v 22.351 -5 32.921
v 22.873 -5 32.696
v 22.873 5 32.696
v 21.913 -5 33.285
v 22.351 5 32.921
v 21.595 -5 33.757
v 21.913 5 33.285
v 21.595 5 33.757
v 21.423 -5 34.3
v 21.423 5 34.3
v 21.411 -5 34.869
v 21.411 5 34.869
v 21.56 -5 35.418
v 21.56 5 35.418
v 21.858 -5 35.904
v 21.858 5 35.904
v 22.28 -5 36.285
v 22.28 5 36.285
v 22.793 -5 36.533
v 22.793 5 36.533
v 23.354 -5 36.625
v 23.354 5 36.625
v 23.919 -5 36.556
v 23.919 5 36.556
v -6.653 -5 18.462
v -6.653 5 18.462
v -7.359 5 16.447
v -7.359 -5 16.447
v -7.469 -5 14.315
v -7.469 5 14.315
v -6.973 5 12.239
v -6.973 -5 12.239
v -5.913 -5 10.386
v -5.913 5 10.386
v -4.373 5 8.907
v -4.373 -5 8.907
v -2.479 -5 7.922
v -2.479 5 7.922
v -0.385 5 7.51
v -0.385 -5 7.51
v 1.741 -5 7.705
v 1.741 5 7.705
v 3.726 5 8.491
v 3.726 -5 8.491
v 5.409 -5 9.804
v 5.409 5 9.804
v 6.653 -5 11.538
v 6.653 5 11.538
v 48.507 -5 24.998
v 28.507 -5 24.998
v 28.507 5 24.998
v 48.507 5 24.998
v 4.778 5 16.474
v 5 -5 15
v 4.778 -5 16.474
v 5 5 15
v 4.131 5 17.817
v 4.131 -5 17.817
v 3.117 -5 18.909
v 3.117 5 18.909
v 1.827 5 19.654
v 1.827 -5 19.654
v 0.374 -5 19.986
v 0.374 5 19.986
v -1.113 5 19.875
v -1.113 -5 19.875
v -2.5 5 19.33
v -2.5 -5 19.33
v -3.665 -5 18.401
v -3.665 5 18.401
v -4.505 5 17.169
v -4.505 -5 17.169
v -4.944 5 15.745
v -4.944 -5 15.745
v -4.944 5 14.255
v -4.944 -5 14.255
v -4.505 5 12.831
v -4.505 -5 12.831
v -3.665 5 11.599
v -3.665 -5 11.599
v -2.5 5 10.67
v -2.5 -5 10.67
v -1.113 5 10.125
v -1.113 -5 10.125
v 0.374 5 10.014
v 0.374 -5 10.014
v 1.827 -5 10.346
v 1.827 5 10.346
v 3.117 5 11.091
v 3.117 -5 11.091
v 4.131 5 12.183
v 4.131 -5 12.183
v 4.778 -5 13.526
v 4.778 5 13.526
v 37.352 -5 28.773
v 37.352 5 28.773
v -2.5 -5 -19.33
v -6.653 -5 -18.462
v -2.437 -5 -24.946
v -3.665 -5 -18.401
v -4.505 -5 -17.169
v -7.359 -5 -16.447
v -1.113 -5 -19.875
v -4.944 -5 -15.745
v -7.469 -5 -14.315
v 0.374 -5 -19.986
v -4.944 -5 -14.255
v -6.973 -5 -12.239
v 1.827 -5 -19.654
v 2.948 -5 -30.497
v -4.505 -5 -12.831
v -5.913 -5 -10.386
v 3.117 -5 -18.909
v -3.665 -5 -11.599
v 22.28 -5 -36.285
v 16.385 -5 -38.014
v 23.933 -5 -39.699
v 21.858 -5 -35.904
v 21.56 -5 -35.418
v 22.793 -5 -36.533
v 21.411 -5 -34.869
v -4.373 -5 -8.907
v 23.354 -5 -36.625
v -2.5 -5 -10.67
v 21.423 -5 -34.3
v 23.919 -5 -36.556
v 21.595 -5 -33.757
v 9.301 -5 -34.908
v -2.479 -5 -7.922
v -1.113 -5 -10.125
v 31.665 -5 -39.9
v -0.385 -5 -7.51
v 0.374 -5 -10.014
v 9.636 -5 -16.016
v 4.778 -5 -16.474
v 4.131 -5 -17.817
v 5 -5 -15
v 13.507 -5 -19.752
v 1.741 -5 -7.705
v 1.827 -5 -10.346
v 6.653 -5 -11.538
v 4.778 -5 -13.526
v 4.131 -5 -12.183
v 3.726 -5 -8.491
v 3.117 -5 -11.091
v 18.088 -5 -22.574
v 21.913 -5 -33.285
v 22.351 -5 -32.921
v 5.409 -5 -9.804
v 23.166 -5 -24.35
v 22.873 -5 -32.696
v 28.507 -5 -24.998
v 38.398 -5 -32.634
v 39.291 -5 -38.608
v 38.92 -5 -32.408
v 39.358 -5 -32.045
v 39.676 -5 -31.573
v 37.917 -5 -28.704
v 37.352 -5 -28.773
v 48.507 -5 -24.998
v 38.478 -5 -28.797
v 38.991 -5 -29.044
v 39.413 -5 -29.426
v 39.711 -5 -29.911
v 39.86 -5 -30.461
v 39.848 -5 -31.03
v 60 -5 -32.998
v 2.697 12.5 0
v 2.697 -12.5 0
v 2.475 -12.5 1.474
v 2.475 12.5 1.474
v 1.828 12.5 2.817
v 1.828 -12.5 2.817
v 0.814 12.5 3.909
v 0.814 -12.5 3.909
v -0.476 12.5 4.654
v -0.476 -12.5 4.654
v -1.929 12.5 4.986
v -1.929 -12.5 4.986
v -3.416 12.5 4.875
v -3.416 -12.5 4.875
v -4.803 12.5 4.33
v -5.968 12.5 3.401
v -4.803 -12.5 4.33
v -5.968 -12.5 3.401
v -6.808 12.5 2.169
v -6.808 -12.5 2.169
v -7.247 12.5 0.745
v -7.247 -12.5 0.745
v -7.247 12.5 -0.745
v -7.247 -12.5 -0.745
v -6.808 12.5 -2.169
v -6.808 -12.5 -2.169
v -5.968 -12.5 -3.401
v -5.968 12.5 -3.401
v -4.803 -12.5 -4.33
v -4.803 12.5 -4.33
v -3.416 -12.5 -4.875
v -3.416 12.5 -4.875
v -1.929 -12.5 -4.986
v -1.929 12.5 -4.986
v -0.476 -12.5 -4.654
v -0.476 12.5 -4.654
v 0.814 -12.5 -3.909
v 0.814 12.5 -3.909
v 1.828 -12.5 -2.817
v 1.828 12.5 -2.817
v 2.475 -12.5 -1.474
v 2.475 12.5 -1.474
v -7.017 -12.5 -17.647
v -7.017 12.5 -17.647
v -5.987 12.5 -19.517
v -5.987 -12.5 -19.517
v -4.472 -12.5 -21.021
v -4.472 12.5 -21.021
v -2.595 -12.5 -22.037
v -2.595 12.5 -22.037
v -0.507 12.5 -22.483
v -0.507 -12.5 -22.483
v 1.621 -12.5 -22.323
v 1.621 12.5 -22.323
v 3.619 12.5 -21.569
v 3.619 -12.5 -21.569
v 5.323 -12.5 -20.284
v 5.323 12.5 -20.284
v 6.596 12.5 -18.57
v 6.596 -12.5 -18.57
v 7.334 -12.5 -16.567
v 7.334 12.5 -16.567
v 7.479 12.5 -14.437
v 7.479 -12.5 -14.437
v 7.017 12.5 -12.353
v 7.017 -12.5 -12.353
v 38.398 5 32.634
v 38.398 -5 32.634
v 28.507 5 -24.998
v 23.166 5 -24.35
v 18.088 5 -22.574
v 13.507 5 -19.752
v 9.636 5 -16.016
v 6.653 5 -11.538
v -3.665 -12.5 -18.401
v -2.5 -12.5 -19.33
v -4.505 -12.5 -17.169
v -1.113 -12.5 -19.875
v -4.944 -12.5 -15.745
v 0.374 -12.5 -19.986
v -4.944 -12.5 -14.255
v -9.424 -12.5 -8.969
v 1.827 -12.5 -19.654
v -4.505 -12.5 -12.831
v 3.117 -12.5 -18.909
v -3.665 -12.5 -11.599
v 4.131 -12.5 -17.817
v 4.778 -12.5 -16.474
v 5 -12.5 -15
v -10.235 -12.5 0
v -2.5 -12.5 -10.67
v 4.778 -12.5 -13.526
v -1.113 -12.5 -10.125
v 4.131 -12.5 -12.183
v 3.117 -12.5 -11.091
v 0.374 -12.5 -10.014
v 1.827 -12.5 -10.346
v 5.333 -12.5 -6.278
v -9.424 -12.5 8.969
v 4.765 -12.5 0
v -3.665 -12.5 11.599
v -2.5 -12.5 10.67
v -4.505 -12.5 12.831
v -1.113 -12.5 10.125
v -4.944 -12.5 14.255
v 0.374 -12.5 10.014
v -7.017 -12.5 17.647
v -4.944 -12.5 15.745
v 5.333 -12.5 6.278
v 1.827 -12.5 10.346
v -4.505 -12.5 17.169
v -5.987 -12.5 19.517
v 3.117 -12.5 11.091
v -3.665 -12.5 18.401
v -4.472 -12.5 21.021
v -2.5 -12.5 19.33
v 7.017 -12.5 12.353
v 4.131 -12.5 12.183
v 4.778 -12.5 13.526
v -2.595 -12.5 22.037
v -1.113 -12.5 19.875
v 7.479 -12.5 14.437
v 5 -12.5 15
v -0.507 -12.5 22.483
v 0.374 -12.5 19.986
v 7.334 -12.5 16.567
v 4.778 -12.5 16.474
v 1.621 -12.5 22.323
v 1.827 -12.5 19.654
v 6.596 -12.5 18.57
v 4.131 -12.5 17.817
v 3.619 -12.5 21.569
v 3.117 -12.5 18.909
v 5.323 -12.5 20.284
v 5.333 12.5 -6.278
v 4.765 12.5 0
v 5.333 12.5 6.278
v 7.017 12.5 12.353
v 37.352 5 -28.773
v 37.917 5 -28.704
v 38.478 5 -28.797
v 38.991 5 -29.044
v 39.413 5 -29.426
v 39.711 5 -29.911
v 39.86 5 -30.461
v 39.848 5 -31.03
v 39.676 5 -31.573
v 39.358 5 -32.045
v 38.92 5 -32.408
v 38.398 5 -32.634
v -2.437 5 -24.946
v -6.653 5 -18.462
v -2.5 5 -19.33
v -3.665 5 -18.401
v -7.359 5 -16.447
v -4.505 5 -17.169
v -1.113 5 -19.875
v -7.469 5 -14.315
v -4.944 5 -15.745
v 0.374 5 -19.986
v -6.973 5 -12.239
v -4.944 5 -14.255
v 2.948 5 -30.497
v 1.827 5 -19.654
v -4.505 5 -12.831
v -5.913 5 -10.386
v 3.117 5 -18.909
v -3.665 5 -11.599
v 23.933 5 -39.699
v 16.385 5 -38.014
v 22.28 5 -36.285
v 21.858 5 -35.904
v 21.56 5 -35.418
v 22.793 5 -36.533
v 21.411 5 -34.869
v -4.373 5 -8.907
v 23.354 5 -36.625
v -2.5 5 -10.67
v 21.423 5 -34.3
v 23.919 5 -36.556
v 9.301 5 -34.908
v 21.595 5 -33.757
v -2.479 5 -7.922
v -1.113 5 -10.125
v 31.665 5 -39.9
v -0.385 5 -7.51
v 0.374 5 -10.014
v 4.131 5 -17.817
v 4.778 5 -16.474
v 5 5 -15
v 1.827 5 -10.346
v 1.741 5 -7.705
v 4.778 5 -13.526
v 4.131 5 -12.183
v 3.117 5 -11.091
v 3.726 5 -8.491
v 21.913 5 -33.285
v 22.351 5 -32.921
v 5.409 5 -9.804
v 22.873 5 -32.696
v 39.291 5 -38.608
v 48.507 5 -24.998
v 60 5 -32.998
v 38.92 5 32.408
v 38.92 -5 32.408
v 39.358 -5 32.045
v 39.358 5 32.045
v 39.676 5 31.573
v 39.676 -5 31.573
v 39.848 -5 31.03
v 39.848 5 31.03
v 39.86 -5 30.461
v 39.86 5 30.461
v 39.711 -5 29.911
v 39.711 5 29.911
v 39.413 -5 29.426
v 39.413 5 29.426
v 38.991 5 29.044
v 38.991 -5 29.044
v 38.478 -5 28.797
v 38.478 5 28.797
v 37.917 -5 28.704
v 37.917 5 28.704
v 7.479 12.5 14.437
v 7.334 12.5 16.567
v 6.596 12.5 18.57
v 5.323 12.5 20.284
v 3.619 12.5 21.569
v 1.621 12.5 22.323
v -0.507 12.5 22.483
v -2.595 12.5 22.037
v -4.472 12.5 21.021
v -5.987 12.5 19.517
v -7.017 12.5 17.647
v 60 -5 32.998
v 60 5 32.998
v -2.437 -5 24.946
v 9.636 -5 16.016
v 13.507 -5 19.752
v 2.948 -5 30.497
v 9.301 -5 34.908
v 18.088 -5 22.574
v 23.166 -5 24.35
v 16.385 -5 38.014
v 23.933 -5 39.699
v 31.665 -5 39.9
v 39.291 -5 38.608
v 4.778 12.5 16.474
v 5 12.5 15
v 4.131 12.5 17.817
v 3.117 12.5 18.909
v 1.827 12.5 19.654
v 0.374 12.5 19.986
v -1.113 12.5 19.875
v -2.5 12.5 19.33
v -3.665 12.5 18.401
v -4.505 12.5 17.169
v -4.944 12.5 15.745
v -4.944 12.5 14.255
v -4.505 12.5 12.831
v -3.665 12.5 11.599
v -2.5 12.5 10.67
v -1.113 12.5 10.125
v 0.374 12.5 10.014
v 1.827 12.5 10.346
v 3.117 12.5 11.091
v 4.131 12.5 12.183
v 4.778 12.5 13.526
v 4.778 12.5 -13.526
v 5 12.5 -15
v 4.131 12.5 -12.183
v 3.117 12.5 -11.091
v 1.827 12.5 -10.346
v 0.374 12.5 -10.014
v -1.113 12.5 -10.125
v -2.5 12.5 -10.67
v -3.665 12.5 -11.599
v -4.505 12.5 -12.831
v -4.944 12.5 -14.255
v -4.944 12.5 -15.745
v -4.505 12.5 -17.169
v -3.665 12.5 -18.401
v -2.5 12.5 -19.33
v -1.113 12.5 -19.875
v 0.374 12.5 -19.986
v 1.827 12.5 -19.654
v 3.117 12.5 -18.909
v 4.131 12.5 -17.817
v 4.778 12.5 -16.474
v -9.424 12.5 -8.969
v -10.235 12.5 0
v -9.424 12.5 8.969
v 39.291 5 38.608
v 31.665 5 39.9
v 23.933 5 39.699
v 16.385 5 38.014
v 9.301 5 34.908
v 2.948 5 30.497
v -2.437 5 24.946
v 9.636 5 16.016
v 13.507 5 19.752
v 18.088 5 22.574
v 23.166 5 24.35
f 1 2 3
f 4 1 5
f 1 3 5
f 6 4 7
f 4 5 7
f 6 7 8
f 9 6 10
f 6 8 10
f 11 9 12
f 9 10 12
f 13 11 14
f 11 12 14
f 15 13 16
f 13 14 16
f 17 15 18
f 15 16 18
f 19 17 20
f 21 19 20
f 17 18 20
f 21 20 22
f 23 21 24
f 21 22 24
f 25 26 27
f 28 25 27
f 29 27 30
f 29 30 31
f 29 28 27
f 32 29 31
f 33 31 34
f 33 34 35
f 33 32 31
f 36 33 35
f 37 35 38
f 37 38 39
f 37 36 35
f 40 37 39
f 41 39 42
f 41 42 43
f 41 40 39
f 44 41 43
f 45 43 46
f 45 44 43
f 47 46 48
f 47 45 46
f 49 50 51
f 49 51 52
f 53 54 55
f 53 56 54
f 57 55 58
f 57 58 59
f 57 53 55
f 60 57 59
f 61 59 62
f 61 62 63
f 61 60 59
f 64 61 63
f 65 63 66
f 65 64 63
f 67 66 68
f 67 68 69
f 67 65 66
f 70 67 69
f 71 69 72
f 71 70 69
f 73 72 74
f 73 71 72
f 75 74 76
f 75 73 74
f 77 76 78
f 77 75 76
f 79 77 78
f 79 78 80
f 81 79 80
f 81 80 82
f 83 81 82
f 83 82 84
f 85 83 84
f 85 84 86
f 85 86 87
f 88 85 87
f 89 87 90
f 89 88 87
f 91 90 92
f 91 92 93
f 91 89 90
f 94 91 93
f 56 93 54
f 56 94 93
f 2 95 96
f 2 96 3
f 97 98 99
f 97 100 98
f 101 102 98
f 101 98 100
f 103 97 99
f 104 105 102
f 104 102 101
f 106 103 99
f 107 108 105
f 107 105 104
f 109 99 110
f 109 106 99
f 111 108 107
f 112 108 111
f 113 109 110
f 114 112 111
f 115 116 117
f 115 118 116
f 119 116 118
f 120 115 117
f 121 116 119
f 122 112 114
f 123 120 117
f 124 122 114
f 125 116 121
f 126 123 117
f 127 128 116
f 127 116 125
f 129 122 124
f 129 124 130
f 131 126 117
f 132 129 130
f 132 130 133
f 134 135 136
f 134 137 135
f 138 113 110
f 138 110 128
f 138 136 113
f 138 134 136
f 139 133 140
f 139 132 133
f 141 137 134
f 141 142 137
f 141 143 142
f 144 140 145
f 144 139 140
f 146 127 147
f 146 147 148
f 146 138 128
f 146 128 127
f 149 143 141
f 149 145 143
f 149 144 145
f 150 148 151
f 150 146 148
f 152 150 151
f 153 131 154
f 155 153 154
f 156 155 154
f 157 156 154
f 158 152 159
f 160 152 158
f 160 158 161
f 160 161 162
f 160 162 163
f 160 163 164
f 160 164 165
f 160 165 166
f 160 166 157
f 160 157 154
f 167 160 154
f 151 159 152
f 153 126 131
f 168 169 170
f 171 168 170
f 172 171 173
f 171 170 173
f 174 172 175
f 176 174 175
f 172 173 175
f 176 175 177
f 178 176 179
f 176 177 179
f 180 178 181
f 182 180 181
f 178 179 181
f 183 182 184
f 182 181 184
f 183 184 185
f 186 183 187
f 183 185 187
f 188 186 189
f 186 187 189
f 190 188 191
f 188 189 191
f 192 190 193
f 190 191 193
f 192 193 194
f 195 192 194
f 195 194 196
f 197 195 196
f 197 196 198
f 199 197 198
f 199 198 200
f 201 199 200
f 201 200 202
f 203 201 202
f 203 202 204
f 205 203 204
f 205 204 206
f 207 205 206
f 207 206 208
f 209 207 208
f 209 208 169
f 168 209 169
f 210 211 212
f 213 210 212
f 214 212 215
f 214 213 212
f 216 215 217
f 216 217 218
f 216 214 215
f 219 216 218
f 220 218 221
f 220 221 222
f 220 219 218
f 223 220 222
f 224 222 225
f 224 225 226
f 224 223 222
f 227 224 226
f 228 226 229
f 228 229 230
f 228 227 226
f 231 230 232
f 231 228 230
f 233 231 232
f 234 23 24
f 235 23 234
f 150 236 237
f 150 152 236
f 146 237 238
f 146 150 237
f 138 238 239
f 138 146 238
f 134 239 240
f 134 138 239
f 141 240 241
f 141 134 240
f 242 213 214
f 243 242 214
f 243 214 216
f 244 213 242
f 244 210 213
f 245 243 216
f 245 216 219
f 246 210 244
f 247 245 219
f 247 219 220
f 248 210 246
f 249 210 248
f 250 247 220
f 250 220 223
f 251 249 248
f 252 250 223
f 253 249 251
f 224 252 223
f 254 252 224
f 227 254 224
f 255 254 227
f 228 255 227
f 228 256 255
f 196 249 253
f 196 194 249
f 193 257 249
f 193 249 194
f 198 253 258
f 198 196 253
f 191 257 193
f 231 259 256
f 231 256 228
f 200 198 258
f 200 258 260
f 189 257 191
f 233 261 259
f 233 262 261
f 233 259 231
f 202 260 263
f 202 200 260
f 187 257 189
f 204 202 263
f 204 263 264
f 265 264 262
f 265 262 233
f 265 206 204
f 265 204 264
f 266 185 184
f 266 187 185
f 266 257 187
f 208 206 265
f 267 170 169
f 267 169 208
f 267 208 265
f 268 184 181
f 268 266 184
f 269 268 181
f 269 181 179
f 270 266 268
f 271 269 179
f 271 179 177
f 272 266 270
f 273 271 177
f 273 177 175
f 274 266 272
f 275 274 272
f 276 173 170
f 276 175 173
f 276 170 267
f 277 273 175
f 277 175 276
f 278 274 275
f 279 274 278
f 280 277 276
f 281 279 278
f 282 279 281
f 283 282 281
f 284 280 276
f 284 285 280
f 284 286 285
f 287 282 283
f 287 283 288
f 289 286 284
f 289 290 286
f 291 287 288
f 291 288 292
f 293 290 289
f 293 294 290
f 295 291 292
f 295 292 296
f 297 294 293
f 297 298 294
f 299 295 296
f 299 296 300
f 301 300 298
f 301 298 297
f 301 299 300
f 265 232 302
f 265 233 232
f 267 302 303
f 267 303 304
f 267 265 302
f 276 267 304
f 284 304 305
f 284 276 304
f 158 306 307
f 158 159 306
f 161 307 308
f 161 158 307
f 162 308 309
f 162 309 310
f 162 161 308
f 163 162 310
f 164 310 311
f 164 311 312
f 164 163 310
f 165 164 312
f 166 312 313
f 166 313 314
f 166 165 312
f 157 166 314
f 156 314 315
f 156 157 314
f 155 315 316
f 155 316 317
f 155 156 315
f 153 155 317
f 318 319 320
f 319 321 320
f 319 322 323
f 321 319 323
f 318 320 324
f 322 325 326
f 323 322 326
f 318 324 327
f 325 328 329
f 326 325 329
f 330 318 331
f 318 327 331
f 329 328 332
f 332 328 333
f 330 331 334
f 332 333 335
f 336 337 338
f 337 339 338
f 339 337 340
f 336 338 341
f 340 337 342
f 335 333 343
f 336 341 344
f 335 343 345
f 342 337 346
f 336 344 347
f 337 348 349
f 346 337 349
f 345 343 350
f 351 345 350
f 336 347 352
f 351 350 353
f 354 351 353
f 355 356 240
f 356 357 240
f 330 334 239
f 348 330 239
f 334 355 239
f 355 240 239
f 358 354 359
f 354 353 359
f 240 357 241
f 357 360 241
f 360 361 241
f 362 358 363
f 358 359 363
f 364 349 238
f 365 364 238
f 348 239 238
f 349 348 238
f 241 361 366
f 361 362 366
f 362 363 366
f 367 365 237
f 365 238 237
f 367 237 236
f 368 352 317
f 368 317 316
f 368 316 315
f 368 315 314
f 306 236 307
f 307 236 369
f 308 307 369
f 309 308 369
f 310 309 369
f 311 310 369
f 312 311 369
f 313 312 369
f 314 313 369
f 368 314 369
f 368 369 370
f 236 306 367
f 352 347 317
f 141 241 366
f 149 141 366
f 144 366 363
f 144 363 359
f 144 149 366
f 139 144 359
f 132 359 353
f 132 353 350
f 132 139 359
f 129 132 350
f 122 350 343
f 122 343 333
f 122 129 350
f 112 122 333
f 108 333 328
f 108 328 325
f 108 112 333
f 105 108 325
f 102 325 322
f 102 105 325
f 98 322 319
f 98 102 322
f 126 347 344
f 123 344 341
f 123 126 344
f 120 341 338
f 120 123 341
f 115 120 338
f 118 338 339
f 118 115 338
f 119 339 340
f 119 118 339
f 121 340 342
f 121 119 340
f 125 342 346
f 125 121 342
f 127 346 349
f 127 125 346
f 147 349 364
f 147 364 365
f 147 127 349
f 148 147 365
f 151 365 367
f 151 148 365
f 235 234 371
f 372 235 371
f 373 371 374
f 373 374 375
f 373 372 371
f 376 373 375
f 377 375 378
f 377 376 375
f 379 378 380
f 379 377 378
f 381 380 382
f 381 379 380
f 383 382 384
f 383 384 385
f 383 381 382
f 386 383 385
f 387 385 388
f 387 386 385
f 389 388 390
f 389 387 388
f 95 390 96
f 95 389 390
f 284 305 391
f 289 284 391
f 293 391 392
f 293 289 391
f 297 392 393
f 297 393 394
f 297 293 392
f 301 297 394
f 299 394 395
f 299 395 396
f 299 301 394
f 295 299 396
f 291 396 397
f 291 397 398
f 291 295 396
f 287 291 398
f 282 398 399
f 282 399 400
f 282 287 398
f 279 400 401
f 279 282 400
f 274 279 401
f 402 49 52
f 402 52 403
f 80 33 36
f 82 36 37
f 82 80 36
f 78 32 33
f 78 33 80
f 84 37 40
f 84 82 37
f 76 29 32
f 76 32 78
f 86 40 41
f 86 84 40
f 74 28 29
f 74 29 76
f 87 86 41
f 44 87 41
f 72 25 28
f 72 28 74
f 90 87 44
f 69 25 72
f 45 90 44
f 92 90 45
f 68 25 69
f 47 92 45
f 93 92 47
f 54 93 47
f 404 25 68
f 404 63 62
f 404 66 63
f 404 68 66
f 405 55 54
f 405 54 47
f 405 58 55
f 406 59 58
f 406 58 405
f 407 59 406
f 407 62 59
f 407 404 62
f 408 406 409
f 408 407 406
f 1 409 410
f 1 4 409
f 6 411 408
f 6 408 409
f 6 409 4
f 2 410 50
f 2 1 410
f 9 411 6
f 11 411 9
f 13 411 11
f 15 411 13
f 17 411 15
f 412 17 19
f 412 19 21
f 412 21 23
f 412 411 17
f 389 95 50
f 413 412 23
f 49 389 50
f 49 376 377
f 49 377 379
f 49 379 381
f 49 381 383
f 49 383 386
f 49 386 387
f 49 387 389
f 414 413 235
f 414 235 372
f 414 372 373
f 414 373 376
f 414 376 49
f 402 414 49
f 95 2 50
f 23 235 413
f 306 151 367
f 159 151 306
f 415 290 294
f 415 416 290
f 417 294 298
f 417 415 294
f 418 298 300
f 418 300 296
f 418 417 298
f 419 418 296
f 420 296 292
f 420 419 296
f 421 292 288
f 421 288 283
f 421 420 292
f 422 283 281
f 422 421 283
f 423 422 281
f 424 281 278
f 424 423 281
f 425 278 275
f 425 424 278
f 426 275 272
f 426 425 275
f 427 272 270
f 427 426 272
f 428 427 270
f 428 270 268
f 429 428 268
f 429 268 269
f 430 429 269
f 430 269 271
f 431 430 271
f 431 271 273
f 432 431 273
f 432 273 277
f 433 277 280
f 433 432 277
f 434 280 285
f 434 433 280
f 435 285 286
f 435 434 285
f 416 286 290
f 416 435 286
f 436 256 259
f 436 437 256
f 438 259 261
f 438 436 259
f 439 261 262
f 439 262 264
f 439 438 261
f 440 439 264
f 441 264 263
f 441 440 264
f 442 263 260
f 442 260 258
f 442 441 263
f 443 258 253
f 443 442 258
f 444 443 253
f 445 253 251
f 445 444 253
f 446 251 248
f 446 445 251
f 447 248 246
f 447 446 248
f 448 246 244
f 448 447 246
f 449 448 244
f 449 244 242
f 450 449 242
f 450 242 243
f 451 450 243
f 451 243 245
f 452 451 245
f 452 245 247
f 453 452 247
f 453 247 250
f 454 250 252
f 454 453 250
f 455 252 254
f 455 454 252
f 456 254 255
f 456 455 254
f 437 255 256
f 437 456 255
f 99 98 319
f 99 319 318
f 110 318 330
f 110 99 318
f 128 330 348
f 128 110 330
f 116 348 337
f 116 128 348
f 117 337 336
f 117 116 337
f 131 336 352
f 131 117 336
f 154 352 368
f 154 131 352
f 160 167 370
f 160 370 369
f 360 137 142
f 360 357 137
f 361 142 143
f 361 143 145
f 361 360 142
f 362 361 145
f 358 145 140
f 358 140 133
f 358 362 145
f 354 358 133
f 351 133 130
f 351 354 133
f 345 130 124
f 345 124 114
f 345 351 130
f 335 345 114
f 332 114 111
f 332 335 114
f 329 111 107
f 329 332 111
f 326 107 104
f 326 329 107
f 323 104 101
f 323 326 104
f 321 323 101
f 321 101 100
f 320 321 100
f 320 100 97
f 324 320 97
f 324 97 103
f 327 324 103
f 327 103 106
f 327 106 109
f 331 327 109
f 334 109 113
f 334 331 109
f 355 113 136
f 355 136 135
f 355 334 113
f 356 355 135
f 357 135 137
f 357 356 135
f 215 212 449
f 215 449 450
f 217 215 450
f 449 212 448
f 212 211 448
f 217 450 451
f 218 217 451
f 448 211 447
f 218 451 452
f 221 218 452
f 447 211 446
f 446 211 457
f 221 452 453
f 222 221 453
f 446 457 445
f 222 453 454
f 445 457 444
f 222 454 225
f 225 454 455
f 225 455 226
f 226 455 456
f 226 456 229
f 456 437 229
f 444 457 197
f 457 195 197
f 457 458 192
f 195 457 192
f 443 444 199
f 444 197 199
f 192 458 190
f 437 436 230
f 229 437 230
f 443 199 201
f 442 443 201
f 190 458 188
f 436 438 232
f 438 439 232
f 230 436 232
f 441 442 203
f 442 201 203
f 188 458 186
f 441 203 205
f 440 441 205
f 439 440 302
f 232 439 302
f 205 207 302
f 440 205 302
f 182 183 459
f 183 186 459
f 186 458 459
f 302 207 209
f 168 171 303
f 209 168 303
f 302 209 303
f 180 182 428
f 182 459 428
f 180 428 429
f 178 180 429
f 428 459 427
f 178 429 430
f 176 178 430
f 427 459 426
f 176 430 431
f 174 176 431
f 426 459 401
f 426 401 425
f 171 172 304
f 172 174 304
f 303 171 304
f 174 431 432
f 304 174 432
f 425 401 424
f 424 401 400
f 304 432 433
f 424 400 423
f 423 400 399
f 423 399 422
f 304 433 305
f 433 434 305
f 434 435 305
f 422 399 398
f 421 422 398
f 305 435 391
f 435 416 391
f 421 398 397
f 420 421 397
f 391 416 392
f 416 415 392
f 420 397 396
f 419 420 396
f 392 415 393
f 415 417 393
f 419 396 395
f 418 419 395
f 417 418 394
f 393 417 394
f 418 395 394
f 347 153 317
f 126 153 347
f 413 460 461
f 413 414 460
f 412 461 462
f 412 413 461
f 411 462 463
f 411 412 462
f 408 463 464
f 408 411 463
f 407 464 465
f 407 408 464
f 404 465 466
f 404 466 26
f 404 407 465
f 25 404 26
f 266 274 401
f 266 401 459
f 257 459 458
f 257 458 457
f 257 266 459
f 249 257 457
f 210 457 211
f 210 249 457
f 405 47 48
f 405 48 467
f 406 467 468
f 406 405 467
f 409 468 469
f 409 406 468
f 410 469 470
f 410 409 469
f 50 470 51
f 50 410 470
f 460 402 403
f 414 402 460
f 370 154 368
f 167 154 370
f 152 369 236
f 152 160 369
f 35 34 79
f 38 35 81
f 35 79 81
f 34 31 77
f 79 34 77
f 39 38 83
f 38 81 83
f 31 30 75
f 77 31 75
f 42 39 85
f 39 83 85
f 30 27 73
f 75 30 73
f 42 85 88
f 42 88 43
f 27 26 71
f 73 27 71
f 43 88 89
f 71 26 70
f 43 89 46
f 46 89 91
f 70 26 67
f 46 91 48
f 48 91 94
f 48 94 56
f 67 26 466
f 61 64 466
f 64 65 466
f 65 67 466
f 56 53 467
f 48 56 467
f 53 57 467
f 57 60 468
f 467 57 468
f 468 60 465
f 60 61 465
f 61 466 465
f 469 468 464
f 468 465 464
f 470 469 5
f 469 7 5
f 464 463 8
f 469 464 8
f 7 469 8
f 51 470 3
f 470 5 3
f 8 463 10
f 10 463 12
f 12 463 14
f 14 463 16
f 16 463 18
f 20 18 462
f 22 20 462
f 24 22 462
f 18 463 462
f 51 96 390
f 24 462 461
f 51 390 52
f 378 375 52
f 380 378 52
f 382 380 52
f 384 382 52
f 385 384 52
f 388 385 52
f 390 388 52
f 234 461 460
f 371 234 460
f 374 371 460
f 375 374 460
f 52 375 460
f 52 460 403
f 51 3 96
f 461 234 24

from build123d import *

# Parameters (mm, degrees)
F0_R     = 5
F1_DEPTH = 12.5
F2_R     = 5
F3_DEPTH = 5
F4_R     = 5
F5_DEPTH = 25.001


with BuildPart() as f1:
    # F0 (on Front) → F1 (new body, symmetric)
    with BuildSketch(Plane.XZ):
        with BuildLine():
            ThreePointArc((7.0173413473, -12.3529411765), (4.7649343015, 0), (7.0173413473, 12.3529411765))
            ThreePointArc((7.0173413473, 12.3529411765), (2.6470588235, 22.0173413473), (-7.0173413473, 17.6470588235))
            ThreePointArc((-7.0173413473, 17.6470588235), (-10.2350656985, 0), (-7.0173413473, -17.6470588235))
            ThreePointArc((-7.0173413473, -17.6470588235), (2.6470588235, -22.0173413473), (7.0173413473, -12.3529411765))
        make_face()
        with Locations((0, -15)):
            Circle(F0_R, mode=Mode.SUBTRACT)
        with Locations((0, 15)):
            Circle(F0_R, mode=Mode.SUBTRACT)
    extrude(amount=F1_DEPTH, both=True)

    # F4 (on face) → F5 (cut, through all)
    with BuildSketch(Plane.XZ.offset(12.5)):
        with Locations((-2.3030399292, 0)):
            Circle(F4_R)
    extrude(amount=-F5_DEPTH, mode=Mode.SUBTRACT)


with BuildPart() as f3:
    # F2 (on Front) → F3 (new body, symmetric)
    with BuildSketch(Plane.XZ):
        with BuildLine():
            ThreePointArc((6.6534014969, 11.5384615385), (7.2852766326, 13.2182187602), (7.5, 15))
            ThreePointArc((7.5, 15), (1.7817812398, 22.2852766326), (-6.6534014969, 18.4615384615))
            ThreePointArc((-6.6534014969, 18.4615384615), (-3.4615384615, 8.3465985031), (6.6534014969, 11.5384615385))
        make_face()
        with Locations((0, 15)):
            Circle(F2_R, mode=Mode.SUBTRACT)
        with BuildLine():
            ThreePointArc((-6.6534014969, 18.4615384615), (1.7817812398, 22.2852766326), (7.5, 15))
            ThreePointArc((7.5, 15), (7.2852766326, 13.2182187602), (6.6534014969, 11.5384615385))
            ThreePointArc((6.6534014969, 11.5384615385), (15.7213002354, 21.286735637), (28.5073433164, 24.997899573))
            Line((28.5073433164, 24.997899573), (48.5073433164, 24.997899573))
            Line((48.5073433164, 24.997899573), (60, 32.997899573))
            Line((60, 32.997899573), (39.2909124051, 38.6082728951))
            ThreePointArc((39.2909124051, 38.6082728951), (12.7678090394, 36.6327836378), (-6.6534014969, 18.4615384615))
        make_face()
        with BuildLine():
            ThreePointArc((22.8734908291, 32.6955017519), (21.4660524803, 35.1488906926), (23.919441421, 36.5563290414))
            Line((23.919441421, 36.5563290414), (38.3975437566, 32.6340143221))
            ThreePointArc((38.3975437566, 32.6340143221), (39.8049821055, 30.1806253814), (37.3515931648, 28.7731870325))
            Line((37.3515931648, 28.7731870325), (22.8734908291, 32.6955017519))
        make_face(mode=Mode.SUBTRACT)
    extrude(amount=F3_DEPTH, both=True)


with BuildPart() as f3b:
    # F2 (on Front) → F3, piece 2 (new body, symmetric)
    with BuildSketch(Plane.XZ):
        with BuildLine():
            ThreePointArc((-6.6534014969, -18.4615384615), (1.7817812398, -22.2852766326), (7.5, -15))
            ThreePointArc((7.5, -15), (7.2852766326, -13.2182187602), (6.6534014969, -11.5384615385))
            ThreePointArc((6.6534014969, -11.5384615385), (-3.4615384615, -8.3465985031), (-6.6534014969, -18.4615384615))
        make_face()
        with Locations((0, -15)):
            Circle(F2_R, mode=Mode.SUBTRACT)
        with BuildLine():
            ThreePointArc((6.6534014969, -11.5384615385), (7.2852766326, -13.2182187602), (7.5, -15))
            ThreePointArc((7.5, -15), (1.7817812398, -22.2852766326), (-6.6534014969, -18.4615384615))
            ThreePointArc((-6.6534014969, -18.4615384615), (12.7678090394, -36.6327836378), (39.2909124051, -38.6082728951))
            Line((39.2909124051, -38.6082728951), (60, -32.997899573))
            Line((60, -32.997899573), (48.5073433164, -24.997899573))
            Line((48.5073433164, -24.997899573), (28.5073433164, -24.997899573))
            ThreePointArc((28.5073433164, -24.997899573), (15.7213002354, -21.286735637), (6.6534014969, -11.5384615385))
        make_face()
        with BuildLine():
            Line((22.8734908291, -32.6955017519), (37.3515931648, -28.7731870325))
            ThreePointArc((37.3515931648, -28.7731870325), (39.8049821055, -30.1806253814), (38.3975437566, -32.6340143221))
            Line((38.3975437566, -32.6340143221), (23.919441421, -36.5563290414))
            ThreePointArc((23.919441421, -36.5563290414), (21.4660524803, -35.1488906926), (22.8734908291, -32.6955017519))
        make_face(mode=Mode.SUBTRACT)
    extrude(amount=F3_DEPTH, both=True)


solid = Compound([f1.part, f3.part, f3b.part])
